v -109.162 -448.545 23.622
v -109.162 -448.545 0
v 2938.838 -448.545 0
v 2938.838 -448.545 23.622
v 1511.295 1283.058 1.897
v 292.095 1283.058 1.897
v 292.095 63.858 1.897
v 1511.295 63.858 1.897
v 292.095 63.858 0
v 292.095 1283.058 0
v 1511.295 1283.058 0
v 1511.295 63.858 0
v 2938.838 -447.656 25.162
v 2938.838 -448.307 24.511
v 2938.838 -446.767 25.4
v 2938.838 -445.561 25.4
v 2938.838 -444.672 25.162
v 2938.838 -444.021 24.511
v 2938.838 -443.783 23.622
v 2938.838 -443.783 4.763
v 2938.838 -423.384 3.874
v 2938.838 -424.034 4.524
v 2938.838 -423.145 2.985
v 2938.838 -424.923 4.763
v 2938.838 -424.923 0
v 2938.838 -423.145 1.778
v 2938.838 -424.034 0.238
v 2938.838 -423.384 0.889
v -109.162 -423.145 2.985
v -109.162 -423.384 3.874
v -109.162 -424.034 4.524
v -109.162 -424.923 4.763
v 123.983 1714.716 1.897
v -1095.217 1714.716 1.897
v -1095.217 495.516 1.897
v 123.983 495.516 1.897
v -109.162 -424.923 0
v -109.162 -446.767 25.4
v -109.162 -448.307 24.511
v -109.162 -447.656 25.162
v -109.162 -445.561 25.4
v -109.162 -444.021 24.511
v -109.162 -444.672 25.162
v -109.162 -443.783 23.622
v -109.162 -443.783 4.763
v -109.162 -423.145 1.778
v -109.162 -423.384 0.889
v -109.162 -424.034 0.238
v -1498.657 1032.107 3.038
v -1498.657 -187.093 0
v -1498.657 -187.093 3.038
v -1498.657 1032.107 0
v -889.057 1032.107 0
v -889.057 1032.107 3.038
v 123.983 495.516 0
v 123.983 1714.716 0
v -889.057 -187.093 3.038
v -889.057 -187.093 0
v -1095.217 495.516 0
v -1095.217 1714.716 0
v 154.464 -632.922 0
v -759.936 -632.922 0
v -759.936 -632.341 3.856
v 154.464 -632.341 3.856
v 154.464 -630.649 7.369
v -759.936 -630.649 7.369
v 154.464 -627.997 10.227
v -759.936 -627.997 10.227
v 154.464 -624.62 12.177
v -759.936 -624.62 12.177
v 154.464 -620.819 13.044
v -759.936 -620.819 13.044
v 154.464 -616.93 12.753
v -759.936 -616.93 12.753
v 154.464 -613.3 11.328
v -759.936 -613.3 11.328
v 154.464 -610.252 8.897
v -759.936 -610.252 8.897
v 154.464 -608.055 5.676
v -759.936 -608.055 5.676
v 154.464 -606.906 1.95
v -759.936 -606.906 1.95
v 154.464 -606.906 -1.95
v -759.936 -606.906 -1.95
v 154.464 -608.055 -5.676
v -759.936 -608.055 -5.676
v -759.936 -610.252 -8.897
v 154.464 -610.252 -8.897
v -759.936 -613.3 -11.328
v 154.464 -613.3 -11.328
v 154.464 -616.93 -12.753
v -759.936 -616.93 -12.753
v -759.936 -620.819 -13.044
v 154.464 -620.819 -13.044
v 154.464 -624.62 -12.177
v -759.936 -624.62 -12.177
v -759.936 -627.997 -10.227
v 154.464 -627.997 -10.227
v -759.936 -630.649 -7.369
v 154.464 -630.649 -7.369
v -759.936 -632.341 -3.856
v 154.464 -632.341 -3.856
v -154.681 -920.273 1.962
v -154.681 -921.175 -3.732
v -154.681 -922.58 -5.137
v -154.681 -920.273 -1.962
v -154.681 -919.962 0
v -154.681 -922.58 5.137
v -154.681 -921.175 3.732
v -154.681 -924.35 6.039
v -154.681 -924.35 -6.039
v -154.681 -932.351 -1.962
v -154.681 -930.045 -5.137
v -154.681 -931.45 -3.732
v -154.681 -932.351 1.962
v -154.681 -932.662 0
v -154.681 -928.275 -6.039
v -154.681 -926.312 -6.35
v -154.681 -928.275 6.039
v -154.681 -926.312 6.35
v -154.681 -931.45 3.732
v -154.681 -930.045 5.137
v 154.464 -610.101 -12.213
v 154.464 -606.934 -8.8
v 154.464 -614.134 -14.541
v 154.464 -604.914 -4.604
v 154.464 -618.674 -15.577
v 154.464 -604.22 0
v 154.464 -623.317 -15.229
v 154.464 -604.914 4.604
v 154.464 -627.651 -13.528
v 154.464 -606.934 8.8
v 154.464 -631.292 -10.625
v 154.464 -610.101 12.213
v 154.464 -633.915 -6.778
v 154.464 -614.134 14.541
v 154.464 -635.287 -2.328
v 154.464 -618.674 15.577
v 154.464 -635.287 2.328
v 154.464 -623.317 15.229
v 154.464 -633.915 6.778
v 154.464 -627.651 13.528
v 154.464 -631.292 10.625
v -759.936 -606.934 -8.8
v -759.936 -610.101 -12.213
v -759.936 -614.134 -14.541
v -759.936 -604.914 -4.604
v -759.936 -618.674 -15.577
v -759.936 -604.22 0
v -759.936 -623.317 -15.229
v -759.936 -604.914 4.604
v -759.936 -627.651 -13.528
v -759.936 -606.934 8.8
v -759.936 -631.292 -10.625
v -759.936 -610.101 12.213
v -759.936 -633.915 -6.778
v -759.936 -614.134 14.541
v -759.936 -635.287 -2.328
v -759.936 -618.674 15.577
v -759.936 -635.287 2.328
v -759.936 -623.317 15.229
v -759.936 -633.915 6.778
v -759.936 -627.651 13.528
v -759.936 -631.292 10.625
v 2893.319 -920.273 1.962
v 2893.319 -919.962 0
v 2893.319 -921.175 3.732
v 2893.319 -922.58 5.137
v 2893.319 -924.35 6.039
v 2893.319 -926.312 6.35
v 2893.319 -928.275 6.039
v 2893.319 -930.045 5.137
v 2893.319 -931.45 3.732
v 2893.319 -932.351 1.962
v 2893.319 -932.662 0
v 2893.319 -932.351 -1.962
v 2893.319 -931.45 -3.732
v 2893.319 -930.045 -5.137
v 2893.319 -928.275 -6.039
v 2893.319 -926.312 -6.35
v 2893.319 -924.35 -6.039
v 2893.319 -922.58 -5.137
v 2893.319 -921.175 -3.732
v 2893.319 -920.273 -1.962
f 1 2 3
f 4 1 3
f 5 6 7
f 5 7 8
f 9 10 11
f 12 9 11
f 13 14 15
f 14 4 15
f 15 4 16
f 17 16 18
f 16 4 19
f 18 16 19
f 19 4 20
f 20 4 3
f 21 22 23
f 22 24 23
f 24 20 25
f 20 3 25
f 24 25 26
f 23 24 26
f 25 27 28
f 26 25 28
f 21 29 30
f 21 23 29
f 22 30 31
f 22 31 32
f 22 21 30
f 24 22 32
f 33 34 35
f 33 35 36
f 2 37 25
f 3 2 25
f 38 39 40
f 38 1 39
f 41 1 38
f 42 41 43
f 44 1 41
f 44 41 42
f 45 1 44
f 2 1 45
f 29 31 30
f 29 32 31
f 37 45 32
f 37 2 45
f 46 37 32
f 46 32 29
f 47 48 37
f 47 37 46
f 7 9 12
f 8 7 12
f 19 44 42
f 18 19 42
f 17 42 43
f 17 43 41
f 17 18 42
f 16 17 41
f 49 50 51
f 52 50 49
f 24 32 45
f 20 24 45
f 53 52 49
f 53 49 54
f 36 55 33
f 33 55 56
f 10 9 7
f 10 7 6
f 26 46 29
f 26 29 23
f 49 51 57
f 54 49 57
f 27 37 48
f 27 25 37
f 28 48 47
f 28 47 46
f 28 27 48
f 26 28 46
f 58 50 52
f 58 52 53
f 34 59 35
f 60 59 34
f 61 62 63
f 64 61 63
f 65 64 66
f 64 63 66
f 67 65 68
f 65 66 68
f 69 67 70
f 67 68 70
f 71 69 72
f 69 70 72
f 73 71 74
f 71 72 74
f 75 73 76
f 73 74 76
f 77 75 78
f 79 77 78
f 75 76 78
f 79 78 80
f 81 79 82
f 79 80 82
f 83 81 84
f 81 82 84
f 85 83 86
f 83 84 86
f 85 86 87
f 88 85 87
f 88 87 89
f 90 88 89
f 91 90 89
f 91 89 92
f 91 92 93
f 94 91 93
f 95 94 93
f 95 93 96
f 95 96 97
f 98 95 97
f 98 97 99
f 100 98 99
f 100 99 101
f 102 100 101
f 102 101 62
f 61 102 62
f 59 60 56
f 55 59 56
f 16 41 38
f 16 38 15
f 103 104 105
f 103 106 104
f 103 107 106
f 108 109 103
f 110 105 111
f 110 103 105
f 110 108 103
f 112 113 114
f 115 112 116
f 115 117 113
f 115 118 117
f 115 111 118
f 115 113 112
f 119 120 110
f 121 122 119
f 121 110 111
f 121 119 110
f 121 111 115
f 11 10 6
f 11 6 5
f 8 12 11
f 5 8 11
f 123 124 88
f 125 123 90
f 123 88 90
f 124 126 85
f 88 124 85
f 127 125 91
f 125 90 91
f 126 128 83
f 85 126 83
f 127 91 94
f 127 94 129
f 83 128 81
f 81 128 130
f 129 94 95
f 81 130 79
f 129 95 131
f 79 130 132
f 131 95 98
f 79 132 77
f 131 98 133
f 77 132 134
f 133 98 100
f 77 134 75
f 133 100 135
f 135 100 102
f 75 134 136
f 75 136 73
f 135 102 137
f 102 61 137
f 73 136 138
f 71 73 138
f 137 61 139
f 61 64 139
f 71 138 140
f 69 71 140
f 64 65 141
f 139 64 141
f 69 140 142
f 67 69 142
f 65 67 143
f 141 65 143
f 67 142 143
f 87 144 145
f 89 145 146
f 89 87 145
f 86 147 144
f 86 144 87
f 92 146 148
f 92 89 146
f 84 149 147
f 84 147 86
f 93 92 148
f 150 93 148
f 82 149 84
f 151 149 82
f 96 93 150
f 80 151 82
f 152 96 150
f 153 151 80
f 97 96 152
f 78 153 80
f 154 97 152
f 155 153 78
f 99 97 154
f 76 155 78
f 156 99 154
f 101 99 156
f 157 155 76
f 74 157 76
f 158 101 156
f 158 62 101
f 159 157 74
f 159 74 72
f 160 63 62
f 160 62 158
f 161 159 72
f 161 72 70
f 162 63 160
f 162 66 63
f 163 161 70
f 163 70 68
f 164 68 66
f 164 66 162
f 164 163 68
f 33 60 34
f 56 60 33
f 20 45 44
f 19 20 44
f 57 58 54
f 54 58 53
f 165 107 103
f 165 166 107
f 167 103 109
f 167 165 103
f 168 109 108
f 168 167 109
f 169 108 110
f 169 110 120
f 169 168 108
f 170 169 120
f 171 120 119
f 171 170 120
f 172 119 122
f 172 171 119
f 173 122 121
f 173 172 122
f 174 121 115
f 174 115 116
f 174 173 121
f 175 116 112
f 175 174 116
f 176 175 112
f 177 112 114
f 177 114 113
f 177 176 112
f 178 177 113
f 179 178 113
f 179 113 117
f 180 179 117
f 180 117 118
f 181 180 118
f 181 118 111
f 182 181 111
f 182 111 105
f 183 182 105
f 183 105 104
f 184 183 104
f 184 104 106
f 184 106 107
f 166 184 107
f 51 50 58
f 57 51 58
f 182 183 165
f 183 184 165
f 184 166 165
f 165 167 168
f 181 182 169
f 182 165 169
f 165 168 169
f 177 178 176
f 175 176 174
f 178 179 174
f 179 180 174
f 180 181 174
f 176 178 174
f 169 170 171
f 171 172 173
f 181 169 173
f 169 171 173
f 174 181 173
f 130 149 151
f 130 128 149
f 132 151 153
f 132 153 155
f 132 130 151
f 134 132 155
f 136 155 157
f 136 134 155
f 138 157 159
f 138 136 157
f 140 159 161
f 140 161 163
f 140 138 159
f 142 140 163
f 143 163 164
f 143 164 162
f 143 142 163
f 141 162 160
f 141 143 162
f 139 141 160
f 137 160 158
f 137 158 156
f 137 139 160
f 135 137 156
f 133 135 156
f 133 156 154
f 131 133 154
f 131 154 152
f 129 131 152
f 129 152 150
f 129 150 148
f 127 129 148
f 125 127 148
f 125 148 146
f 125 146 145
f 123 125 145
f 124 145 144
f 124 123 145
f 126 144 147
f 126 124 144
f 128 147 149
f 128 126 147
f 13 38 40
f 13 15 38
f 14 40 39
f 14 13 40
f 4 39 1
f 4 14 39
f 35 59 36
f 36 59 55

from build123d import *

# Parameters (mm, degrees)
F0_W      = 609.6
F0_H      = 1219.2
F6_DEPTH  = 3.03784
F1_W      = 1219.2
F1_H      = 1219.2
F7_DEPTH  = 1.89738
F2_W      = 1219.2
F2_H      = 1219.2
F8_DEPTH  = 1.89738
F3_W      = 3048
F3_H      = 25.4
F9_DEPTH  = 25.4
F4_W      = 914.4
F4_H      = 15.621
F11_R     = 13.081
F12_DEPTH = 3698.7757727905
F5_W      = 3048
F5_H      = 6.35
F14_W     = 20.6375
F14_H     = 20.6375
F15_DEPTH = 3048.001
F16_R     = 1.778


with BuildPart() as f6:
    # F0 (on Top) → F6 (new body)
    with BuildSketch(Plane.XY):
        with Locations((-1193.8568949782, 422.5071445107)):
            Rectangle(F0_W, F0_H)
    extrude(amount=F6_DEPTH)


with BuildPart() as f7:
    # F1 (on Top) → F7 (new body)
    with BuildSketch(Plane.XY):
        with Locations((-485.6167137623, 1105.116093429)):
            Rectangle(F1_W, F1_H)
    extrude(amount=F7_DEPTH)


with BuildPart() as f8:
    # F2 (on Top) → F8 (new body)
    with BuildSketch(Plane.XY):
        with Locations((901.6953110695, 673.4575437766)):
            Rectangle(F2_W, F2_H)
    extrude(amount=F8_DEPTH)


with BuildPart() as f9:
    # F3 (on Top) → F9 (new body)
    with BuildSketch(Plane.XY):
        with Locations((1414.8383377057, -435.8453452587)):
            Rectangle(F3_W, F3_H)
    extrude(amount=F9_DEPTH)

    # F14 (on face) → F15 (cut, through all)
    with BuildSketch(Plane(origin=(-109.1616622943, 0, 0), x_dir=(0, -1, 0), z_dir=(-1, 0, 0))):
        with Locations((433.4640952587, 15.08125)):
            Rectangle(F14_W, F14_H)
    extrude(amount=-F15_DEPTH, mode=Mode.SUBTRACT)

    # F16
    f16_edges = [f9.edges().sort_by_distance(p)[0] for p in [
        (1414.838338, -423.145345, 4.7625),
        (1414.838338, -443.782845, 25.4),
        (1414.838338, -448.545345, 25.4),
        (1414.838338, -423.145345, 0),
    ]]
    fillet(f16_edges, radius=F16_R)


with BuildPart() as f10:
    # F4 (on Top) → F10 (revolve)
    with BuildSketch(Plane.XY):
        with Locations((-302.7364350848, -612.0304689426)):
            Rectangle(F4_W, F4_H)
    revolve(axis=Axis((-302.7364350848, -619.8409689426, 0), (1, 0, 0)))

    # F11 (on face) → F12 (cut, through all)
    with BuildSketch(Plane(origin=(-759.9364350848, 0, 0), x_dir=(0, -1, 0), z_dir=(-1, 0, 0))):
        with Locations((619.8409689426, 0)):
            Circle(F11_R)
    extrude(amount=-F12_DEPTH, mode=Mode.SUBTRACT)


with BuildPart() as f13:
    # F5 (on Top) → F13 (revolve)
    with BuildSketch(Plane.XY):
        with Locations((1369.3187137015, -923.1372773647)):
            Rectangle(F5_W, F5_H)
    revolve(axis=Axis((1369.3187137015, -926.3122773647, 0), (1, 0, 0)))


solid = Compound([f6.part, f7.part, f8.part, f9.part, f10.part, f13.part])
